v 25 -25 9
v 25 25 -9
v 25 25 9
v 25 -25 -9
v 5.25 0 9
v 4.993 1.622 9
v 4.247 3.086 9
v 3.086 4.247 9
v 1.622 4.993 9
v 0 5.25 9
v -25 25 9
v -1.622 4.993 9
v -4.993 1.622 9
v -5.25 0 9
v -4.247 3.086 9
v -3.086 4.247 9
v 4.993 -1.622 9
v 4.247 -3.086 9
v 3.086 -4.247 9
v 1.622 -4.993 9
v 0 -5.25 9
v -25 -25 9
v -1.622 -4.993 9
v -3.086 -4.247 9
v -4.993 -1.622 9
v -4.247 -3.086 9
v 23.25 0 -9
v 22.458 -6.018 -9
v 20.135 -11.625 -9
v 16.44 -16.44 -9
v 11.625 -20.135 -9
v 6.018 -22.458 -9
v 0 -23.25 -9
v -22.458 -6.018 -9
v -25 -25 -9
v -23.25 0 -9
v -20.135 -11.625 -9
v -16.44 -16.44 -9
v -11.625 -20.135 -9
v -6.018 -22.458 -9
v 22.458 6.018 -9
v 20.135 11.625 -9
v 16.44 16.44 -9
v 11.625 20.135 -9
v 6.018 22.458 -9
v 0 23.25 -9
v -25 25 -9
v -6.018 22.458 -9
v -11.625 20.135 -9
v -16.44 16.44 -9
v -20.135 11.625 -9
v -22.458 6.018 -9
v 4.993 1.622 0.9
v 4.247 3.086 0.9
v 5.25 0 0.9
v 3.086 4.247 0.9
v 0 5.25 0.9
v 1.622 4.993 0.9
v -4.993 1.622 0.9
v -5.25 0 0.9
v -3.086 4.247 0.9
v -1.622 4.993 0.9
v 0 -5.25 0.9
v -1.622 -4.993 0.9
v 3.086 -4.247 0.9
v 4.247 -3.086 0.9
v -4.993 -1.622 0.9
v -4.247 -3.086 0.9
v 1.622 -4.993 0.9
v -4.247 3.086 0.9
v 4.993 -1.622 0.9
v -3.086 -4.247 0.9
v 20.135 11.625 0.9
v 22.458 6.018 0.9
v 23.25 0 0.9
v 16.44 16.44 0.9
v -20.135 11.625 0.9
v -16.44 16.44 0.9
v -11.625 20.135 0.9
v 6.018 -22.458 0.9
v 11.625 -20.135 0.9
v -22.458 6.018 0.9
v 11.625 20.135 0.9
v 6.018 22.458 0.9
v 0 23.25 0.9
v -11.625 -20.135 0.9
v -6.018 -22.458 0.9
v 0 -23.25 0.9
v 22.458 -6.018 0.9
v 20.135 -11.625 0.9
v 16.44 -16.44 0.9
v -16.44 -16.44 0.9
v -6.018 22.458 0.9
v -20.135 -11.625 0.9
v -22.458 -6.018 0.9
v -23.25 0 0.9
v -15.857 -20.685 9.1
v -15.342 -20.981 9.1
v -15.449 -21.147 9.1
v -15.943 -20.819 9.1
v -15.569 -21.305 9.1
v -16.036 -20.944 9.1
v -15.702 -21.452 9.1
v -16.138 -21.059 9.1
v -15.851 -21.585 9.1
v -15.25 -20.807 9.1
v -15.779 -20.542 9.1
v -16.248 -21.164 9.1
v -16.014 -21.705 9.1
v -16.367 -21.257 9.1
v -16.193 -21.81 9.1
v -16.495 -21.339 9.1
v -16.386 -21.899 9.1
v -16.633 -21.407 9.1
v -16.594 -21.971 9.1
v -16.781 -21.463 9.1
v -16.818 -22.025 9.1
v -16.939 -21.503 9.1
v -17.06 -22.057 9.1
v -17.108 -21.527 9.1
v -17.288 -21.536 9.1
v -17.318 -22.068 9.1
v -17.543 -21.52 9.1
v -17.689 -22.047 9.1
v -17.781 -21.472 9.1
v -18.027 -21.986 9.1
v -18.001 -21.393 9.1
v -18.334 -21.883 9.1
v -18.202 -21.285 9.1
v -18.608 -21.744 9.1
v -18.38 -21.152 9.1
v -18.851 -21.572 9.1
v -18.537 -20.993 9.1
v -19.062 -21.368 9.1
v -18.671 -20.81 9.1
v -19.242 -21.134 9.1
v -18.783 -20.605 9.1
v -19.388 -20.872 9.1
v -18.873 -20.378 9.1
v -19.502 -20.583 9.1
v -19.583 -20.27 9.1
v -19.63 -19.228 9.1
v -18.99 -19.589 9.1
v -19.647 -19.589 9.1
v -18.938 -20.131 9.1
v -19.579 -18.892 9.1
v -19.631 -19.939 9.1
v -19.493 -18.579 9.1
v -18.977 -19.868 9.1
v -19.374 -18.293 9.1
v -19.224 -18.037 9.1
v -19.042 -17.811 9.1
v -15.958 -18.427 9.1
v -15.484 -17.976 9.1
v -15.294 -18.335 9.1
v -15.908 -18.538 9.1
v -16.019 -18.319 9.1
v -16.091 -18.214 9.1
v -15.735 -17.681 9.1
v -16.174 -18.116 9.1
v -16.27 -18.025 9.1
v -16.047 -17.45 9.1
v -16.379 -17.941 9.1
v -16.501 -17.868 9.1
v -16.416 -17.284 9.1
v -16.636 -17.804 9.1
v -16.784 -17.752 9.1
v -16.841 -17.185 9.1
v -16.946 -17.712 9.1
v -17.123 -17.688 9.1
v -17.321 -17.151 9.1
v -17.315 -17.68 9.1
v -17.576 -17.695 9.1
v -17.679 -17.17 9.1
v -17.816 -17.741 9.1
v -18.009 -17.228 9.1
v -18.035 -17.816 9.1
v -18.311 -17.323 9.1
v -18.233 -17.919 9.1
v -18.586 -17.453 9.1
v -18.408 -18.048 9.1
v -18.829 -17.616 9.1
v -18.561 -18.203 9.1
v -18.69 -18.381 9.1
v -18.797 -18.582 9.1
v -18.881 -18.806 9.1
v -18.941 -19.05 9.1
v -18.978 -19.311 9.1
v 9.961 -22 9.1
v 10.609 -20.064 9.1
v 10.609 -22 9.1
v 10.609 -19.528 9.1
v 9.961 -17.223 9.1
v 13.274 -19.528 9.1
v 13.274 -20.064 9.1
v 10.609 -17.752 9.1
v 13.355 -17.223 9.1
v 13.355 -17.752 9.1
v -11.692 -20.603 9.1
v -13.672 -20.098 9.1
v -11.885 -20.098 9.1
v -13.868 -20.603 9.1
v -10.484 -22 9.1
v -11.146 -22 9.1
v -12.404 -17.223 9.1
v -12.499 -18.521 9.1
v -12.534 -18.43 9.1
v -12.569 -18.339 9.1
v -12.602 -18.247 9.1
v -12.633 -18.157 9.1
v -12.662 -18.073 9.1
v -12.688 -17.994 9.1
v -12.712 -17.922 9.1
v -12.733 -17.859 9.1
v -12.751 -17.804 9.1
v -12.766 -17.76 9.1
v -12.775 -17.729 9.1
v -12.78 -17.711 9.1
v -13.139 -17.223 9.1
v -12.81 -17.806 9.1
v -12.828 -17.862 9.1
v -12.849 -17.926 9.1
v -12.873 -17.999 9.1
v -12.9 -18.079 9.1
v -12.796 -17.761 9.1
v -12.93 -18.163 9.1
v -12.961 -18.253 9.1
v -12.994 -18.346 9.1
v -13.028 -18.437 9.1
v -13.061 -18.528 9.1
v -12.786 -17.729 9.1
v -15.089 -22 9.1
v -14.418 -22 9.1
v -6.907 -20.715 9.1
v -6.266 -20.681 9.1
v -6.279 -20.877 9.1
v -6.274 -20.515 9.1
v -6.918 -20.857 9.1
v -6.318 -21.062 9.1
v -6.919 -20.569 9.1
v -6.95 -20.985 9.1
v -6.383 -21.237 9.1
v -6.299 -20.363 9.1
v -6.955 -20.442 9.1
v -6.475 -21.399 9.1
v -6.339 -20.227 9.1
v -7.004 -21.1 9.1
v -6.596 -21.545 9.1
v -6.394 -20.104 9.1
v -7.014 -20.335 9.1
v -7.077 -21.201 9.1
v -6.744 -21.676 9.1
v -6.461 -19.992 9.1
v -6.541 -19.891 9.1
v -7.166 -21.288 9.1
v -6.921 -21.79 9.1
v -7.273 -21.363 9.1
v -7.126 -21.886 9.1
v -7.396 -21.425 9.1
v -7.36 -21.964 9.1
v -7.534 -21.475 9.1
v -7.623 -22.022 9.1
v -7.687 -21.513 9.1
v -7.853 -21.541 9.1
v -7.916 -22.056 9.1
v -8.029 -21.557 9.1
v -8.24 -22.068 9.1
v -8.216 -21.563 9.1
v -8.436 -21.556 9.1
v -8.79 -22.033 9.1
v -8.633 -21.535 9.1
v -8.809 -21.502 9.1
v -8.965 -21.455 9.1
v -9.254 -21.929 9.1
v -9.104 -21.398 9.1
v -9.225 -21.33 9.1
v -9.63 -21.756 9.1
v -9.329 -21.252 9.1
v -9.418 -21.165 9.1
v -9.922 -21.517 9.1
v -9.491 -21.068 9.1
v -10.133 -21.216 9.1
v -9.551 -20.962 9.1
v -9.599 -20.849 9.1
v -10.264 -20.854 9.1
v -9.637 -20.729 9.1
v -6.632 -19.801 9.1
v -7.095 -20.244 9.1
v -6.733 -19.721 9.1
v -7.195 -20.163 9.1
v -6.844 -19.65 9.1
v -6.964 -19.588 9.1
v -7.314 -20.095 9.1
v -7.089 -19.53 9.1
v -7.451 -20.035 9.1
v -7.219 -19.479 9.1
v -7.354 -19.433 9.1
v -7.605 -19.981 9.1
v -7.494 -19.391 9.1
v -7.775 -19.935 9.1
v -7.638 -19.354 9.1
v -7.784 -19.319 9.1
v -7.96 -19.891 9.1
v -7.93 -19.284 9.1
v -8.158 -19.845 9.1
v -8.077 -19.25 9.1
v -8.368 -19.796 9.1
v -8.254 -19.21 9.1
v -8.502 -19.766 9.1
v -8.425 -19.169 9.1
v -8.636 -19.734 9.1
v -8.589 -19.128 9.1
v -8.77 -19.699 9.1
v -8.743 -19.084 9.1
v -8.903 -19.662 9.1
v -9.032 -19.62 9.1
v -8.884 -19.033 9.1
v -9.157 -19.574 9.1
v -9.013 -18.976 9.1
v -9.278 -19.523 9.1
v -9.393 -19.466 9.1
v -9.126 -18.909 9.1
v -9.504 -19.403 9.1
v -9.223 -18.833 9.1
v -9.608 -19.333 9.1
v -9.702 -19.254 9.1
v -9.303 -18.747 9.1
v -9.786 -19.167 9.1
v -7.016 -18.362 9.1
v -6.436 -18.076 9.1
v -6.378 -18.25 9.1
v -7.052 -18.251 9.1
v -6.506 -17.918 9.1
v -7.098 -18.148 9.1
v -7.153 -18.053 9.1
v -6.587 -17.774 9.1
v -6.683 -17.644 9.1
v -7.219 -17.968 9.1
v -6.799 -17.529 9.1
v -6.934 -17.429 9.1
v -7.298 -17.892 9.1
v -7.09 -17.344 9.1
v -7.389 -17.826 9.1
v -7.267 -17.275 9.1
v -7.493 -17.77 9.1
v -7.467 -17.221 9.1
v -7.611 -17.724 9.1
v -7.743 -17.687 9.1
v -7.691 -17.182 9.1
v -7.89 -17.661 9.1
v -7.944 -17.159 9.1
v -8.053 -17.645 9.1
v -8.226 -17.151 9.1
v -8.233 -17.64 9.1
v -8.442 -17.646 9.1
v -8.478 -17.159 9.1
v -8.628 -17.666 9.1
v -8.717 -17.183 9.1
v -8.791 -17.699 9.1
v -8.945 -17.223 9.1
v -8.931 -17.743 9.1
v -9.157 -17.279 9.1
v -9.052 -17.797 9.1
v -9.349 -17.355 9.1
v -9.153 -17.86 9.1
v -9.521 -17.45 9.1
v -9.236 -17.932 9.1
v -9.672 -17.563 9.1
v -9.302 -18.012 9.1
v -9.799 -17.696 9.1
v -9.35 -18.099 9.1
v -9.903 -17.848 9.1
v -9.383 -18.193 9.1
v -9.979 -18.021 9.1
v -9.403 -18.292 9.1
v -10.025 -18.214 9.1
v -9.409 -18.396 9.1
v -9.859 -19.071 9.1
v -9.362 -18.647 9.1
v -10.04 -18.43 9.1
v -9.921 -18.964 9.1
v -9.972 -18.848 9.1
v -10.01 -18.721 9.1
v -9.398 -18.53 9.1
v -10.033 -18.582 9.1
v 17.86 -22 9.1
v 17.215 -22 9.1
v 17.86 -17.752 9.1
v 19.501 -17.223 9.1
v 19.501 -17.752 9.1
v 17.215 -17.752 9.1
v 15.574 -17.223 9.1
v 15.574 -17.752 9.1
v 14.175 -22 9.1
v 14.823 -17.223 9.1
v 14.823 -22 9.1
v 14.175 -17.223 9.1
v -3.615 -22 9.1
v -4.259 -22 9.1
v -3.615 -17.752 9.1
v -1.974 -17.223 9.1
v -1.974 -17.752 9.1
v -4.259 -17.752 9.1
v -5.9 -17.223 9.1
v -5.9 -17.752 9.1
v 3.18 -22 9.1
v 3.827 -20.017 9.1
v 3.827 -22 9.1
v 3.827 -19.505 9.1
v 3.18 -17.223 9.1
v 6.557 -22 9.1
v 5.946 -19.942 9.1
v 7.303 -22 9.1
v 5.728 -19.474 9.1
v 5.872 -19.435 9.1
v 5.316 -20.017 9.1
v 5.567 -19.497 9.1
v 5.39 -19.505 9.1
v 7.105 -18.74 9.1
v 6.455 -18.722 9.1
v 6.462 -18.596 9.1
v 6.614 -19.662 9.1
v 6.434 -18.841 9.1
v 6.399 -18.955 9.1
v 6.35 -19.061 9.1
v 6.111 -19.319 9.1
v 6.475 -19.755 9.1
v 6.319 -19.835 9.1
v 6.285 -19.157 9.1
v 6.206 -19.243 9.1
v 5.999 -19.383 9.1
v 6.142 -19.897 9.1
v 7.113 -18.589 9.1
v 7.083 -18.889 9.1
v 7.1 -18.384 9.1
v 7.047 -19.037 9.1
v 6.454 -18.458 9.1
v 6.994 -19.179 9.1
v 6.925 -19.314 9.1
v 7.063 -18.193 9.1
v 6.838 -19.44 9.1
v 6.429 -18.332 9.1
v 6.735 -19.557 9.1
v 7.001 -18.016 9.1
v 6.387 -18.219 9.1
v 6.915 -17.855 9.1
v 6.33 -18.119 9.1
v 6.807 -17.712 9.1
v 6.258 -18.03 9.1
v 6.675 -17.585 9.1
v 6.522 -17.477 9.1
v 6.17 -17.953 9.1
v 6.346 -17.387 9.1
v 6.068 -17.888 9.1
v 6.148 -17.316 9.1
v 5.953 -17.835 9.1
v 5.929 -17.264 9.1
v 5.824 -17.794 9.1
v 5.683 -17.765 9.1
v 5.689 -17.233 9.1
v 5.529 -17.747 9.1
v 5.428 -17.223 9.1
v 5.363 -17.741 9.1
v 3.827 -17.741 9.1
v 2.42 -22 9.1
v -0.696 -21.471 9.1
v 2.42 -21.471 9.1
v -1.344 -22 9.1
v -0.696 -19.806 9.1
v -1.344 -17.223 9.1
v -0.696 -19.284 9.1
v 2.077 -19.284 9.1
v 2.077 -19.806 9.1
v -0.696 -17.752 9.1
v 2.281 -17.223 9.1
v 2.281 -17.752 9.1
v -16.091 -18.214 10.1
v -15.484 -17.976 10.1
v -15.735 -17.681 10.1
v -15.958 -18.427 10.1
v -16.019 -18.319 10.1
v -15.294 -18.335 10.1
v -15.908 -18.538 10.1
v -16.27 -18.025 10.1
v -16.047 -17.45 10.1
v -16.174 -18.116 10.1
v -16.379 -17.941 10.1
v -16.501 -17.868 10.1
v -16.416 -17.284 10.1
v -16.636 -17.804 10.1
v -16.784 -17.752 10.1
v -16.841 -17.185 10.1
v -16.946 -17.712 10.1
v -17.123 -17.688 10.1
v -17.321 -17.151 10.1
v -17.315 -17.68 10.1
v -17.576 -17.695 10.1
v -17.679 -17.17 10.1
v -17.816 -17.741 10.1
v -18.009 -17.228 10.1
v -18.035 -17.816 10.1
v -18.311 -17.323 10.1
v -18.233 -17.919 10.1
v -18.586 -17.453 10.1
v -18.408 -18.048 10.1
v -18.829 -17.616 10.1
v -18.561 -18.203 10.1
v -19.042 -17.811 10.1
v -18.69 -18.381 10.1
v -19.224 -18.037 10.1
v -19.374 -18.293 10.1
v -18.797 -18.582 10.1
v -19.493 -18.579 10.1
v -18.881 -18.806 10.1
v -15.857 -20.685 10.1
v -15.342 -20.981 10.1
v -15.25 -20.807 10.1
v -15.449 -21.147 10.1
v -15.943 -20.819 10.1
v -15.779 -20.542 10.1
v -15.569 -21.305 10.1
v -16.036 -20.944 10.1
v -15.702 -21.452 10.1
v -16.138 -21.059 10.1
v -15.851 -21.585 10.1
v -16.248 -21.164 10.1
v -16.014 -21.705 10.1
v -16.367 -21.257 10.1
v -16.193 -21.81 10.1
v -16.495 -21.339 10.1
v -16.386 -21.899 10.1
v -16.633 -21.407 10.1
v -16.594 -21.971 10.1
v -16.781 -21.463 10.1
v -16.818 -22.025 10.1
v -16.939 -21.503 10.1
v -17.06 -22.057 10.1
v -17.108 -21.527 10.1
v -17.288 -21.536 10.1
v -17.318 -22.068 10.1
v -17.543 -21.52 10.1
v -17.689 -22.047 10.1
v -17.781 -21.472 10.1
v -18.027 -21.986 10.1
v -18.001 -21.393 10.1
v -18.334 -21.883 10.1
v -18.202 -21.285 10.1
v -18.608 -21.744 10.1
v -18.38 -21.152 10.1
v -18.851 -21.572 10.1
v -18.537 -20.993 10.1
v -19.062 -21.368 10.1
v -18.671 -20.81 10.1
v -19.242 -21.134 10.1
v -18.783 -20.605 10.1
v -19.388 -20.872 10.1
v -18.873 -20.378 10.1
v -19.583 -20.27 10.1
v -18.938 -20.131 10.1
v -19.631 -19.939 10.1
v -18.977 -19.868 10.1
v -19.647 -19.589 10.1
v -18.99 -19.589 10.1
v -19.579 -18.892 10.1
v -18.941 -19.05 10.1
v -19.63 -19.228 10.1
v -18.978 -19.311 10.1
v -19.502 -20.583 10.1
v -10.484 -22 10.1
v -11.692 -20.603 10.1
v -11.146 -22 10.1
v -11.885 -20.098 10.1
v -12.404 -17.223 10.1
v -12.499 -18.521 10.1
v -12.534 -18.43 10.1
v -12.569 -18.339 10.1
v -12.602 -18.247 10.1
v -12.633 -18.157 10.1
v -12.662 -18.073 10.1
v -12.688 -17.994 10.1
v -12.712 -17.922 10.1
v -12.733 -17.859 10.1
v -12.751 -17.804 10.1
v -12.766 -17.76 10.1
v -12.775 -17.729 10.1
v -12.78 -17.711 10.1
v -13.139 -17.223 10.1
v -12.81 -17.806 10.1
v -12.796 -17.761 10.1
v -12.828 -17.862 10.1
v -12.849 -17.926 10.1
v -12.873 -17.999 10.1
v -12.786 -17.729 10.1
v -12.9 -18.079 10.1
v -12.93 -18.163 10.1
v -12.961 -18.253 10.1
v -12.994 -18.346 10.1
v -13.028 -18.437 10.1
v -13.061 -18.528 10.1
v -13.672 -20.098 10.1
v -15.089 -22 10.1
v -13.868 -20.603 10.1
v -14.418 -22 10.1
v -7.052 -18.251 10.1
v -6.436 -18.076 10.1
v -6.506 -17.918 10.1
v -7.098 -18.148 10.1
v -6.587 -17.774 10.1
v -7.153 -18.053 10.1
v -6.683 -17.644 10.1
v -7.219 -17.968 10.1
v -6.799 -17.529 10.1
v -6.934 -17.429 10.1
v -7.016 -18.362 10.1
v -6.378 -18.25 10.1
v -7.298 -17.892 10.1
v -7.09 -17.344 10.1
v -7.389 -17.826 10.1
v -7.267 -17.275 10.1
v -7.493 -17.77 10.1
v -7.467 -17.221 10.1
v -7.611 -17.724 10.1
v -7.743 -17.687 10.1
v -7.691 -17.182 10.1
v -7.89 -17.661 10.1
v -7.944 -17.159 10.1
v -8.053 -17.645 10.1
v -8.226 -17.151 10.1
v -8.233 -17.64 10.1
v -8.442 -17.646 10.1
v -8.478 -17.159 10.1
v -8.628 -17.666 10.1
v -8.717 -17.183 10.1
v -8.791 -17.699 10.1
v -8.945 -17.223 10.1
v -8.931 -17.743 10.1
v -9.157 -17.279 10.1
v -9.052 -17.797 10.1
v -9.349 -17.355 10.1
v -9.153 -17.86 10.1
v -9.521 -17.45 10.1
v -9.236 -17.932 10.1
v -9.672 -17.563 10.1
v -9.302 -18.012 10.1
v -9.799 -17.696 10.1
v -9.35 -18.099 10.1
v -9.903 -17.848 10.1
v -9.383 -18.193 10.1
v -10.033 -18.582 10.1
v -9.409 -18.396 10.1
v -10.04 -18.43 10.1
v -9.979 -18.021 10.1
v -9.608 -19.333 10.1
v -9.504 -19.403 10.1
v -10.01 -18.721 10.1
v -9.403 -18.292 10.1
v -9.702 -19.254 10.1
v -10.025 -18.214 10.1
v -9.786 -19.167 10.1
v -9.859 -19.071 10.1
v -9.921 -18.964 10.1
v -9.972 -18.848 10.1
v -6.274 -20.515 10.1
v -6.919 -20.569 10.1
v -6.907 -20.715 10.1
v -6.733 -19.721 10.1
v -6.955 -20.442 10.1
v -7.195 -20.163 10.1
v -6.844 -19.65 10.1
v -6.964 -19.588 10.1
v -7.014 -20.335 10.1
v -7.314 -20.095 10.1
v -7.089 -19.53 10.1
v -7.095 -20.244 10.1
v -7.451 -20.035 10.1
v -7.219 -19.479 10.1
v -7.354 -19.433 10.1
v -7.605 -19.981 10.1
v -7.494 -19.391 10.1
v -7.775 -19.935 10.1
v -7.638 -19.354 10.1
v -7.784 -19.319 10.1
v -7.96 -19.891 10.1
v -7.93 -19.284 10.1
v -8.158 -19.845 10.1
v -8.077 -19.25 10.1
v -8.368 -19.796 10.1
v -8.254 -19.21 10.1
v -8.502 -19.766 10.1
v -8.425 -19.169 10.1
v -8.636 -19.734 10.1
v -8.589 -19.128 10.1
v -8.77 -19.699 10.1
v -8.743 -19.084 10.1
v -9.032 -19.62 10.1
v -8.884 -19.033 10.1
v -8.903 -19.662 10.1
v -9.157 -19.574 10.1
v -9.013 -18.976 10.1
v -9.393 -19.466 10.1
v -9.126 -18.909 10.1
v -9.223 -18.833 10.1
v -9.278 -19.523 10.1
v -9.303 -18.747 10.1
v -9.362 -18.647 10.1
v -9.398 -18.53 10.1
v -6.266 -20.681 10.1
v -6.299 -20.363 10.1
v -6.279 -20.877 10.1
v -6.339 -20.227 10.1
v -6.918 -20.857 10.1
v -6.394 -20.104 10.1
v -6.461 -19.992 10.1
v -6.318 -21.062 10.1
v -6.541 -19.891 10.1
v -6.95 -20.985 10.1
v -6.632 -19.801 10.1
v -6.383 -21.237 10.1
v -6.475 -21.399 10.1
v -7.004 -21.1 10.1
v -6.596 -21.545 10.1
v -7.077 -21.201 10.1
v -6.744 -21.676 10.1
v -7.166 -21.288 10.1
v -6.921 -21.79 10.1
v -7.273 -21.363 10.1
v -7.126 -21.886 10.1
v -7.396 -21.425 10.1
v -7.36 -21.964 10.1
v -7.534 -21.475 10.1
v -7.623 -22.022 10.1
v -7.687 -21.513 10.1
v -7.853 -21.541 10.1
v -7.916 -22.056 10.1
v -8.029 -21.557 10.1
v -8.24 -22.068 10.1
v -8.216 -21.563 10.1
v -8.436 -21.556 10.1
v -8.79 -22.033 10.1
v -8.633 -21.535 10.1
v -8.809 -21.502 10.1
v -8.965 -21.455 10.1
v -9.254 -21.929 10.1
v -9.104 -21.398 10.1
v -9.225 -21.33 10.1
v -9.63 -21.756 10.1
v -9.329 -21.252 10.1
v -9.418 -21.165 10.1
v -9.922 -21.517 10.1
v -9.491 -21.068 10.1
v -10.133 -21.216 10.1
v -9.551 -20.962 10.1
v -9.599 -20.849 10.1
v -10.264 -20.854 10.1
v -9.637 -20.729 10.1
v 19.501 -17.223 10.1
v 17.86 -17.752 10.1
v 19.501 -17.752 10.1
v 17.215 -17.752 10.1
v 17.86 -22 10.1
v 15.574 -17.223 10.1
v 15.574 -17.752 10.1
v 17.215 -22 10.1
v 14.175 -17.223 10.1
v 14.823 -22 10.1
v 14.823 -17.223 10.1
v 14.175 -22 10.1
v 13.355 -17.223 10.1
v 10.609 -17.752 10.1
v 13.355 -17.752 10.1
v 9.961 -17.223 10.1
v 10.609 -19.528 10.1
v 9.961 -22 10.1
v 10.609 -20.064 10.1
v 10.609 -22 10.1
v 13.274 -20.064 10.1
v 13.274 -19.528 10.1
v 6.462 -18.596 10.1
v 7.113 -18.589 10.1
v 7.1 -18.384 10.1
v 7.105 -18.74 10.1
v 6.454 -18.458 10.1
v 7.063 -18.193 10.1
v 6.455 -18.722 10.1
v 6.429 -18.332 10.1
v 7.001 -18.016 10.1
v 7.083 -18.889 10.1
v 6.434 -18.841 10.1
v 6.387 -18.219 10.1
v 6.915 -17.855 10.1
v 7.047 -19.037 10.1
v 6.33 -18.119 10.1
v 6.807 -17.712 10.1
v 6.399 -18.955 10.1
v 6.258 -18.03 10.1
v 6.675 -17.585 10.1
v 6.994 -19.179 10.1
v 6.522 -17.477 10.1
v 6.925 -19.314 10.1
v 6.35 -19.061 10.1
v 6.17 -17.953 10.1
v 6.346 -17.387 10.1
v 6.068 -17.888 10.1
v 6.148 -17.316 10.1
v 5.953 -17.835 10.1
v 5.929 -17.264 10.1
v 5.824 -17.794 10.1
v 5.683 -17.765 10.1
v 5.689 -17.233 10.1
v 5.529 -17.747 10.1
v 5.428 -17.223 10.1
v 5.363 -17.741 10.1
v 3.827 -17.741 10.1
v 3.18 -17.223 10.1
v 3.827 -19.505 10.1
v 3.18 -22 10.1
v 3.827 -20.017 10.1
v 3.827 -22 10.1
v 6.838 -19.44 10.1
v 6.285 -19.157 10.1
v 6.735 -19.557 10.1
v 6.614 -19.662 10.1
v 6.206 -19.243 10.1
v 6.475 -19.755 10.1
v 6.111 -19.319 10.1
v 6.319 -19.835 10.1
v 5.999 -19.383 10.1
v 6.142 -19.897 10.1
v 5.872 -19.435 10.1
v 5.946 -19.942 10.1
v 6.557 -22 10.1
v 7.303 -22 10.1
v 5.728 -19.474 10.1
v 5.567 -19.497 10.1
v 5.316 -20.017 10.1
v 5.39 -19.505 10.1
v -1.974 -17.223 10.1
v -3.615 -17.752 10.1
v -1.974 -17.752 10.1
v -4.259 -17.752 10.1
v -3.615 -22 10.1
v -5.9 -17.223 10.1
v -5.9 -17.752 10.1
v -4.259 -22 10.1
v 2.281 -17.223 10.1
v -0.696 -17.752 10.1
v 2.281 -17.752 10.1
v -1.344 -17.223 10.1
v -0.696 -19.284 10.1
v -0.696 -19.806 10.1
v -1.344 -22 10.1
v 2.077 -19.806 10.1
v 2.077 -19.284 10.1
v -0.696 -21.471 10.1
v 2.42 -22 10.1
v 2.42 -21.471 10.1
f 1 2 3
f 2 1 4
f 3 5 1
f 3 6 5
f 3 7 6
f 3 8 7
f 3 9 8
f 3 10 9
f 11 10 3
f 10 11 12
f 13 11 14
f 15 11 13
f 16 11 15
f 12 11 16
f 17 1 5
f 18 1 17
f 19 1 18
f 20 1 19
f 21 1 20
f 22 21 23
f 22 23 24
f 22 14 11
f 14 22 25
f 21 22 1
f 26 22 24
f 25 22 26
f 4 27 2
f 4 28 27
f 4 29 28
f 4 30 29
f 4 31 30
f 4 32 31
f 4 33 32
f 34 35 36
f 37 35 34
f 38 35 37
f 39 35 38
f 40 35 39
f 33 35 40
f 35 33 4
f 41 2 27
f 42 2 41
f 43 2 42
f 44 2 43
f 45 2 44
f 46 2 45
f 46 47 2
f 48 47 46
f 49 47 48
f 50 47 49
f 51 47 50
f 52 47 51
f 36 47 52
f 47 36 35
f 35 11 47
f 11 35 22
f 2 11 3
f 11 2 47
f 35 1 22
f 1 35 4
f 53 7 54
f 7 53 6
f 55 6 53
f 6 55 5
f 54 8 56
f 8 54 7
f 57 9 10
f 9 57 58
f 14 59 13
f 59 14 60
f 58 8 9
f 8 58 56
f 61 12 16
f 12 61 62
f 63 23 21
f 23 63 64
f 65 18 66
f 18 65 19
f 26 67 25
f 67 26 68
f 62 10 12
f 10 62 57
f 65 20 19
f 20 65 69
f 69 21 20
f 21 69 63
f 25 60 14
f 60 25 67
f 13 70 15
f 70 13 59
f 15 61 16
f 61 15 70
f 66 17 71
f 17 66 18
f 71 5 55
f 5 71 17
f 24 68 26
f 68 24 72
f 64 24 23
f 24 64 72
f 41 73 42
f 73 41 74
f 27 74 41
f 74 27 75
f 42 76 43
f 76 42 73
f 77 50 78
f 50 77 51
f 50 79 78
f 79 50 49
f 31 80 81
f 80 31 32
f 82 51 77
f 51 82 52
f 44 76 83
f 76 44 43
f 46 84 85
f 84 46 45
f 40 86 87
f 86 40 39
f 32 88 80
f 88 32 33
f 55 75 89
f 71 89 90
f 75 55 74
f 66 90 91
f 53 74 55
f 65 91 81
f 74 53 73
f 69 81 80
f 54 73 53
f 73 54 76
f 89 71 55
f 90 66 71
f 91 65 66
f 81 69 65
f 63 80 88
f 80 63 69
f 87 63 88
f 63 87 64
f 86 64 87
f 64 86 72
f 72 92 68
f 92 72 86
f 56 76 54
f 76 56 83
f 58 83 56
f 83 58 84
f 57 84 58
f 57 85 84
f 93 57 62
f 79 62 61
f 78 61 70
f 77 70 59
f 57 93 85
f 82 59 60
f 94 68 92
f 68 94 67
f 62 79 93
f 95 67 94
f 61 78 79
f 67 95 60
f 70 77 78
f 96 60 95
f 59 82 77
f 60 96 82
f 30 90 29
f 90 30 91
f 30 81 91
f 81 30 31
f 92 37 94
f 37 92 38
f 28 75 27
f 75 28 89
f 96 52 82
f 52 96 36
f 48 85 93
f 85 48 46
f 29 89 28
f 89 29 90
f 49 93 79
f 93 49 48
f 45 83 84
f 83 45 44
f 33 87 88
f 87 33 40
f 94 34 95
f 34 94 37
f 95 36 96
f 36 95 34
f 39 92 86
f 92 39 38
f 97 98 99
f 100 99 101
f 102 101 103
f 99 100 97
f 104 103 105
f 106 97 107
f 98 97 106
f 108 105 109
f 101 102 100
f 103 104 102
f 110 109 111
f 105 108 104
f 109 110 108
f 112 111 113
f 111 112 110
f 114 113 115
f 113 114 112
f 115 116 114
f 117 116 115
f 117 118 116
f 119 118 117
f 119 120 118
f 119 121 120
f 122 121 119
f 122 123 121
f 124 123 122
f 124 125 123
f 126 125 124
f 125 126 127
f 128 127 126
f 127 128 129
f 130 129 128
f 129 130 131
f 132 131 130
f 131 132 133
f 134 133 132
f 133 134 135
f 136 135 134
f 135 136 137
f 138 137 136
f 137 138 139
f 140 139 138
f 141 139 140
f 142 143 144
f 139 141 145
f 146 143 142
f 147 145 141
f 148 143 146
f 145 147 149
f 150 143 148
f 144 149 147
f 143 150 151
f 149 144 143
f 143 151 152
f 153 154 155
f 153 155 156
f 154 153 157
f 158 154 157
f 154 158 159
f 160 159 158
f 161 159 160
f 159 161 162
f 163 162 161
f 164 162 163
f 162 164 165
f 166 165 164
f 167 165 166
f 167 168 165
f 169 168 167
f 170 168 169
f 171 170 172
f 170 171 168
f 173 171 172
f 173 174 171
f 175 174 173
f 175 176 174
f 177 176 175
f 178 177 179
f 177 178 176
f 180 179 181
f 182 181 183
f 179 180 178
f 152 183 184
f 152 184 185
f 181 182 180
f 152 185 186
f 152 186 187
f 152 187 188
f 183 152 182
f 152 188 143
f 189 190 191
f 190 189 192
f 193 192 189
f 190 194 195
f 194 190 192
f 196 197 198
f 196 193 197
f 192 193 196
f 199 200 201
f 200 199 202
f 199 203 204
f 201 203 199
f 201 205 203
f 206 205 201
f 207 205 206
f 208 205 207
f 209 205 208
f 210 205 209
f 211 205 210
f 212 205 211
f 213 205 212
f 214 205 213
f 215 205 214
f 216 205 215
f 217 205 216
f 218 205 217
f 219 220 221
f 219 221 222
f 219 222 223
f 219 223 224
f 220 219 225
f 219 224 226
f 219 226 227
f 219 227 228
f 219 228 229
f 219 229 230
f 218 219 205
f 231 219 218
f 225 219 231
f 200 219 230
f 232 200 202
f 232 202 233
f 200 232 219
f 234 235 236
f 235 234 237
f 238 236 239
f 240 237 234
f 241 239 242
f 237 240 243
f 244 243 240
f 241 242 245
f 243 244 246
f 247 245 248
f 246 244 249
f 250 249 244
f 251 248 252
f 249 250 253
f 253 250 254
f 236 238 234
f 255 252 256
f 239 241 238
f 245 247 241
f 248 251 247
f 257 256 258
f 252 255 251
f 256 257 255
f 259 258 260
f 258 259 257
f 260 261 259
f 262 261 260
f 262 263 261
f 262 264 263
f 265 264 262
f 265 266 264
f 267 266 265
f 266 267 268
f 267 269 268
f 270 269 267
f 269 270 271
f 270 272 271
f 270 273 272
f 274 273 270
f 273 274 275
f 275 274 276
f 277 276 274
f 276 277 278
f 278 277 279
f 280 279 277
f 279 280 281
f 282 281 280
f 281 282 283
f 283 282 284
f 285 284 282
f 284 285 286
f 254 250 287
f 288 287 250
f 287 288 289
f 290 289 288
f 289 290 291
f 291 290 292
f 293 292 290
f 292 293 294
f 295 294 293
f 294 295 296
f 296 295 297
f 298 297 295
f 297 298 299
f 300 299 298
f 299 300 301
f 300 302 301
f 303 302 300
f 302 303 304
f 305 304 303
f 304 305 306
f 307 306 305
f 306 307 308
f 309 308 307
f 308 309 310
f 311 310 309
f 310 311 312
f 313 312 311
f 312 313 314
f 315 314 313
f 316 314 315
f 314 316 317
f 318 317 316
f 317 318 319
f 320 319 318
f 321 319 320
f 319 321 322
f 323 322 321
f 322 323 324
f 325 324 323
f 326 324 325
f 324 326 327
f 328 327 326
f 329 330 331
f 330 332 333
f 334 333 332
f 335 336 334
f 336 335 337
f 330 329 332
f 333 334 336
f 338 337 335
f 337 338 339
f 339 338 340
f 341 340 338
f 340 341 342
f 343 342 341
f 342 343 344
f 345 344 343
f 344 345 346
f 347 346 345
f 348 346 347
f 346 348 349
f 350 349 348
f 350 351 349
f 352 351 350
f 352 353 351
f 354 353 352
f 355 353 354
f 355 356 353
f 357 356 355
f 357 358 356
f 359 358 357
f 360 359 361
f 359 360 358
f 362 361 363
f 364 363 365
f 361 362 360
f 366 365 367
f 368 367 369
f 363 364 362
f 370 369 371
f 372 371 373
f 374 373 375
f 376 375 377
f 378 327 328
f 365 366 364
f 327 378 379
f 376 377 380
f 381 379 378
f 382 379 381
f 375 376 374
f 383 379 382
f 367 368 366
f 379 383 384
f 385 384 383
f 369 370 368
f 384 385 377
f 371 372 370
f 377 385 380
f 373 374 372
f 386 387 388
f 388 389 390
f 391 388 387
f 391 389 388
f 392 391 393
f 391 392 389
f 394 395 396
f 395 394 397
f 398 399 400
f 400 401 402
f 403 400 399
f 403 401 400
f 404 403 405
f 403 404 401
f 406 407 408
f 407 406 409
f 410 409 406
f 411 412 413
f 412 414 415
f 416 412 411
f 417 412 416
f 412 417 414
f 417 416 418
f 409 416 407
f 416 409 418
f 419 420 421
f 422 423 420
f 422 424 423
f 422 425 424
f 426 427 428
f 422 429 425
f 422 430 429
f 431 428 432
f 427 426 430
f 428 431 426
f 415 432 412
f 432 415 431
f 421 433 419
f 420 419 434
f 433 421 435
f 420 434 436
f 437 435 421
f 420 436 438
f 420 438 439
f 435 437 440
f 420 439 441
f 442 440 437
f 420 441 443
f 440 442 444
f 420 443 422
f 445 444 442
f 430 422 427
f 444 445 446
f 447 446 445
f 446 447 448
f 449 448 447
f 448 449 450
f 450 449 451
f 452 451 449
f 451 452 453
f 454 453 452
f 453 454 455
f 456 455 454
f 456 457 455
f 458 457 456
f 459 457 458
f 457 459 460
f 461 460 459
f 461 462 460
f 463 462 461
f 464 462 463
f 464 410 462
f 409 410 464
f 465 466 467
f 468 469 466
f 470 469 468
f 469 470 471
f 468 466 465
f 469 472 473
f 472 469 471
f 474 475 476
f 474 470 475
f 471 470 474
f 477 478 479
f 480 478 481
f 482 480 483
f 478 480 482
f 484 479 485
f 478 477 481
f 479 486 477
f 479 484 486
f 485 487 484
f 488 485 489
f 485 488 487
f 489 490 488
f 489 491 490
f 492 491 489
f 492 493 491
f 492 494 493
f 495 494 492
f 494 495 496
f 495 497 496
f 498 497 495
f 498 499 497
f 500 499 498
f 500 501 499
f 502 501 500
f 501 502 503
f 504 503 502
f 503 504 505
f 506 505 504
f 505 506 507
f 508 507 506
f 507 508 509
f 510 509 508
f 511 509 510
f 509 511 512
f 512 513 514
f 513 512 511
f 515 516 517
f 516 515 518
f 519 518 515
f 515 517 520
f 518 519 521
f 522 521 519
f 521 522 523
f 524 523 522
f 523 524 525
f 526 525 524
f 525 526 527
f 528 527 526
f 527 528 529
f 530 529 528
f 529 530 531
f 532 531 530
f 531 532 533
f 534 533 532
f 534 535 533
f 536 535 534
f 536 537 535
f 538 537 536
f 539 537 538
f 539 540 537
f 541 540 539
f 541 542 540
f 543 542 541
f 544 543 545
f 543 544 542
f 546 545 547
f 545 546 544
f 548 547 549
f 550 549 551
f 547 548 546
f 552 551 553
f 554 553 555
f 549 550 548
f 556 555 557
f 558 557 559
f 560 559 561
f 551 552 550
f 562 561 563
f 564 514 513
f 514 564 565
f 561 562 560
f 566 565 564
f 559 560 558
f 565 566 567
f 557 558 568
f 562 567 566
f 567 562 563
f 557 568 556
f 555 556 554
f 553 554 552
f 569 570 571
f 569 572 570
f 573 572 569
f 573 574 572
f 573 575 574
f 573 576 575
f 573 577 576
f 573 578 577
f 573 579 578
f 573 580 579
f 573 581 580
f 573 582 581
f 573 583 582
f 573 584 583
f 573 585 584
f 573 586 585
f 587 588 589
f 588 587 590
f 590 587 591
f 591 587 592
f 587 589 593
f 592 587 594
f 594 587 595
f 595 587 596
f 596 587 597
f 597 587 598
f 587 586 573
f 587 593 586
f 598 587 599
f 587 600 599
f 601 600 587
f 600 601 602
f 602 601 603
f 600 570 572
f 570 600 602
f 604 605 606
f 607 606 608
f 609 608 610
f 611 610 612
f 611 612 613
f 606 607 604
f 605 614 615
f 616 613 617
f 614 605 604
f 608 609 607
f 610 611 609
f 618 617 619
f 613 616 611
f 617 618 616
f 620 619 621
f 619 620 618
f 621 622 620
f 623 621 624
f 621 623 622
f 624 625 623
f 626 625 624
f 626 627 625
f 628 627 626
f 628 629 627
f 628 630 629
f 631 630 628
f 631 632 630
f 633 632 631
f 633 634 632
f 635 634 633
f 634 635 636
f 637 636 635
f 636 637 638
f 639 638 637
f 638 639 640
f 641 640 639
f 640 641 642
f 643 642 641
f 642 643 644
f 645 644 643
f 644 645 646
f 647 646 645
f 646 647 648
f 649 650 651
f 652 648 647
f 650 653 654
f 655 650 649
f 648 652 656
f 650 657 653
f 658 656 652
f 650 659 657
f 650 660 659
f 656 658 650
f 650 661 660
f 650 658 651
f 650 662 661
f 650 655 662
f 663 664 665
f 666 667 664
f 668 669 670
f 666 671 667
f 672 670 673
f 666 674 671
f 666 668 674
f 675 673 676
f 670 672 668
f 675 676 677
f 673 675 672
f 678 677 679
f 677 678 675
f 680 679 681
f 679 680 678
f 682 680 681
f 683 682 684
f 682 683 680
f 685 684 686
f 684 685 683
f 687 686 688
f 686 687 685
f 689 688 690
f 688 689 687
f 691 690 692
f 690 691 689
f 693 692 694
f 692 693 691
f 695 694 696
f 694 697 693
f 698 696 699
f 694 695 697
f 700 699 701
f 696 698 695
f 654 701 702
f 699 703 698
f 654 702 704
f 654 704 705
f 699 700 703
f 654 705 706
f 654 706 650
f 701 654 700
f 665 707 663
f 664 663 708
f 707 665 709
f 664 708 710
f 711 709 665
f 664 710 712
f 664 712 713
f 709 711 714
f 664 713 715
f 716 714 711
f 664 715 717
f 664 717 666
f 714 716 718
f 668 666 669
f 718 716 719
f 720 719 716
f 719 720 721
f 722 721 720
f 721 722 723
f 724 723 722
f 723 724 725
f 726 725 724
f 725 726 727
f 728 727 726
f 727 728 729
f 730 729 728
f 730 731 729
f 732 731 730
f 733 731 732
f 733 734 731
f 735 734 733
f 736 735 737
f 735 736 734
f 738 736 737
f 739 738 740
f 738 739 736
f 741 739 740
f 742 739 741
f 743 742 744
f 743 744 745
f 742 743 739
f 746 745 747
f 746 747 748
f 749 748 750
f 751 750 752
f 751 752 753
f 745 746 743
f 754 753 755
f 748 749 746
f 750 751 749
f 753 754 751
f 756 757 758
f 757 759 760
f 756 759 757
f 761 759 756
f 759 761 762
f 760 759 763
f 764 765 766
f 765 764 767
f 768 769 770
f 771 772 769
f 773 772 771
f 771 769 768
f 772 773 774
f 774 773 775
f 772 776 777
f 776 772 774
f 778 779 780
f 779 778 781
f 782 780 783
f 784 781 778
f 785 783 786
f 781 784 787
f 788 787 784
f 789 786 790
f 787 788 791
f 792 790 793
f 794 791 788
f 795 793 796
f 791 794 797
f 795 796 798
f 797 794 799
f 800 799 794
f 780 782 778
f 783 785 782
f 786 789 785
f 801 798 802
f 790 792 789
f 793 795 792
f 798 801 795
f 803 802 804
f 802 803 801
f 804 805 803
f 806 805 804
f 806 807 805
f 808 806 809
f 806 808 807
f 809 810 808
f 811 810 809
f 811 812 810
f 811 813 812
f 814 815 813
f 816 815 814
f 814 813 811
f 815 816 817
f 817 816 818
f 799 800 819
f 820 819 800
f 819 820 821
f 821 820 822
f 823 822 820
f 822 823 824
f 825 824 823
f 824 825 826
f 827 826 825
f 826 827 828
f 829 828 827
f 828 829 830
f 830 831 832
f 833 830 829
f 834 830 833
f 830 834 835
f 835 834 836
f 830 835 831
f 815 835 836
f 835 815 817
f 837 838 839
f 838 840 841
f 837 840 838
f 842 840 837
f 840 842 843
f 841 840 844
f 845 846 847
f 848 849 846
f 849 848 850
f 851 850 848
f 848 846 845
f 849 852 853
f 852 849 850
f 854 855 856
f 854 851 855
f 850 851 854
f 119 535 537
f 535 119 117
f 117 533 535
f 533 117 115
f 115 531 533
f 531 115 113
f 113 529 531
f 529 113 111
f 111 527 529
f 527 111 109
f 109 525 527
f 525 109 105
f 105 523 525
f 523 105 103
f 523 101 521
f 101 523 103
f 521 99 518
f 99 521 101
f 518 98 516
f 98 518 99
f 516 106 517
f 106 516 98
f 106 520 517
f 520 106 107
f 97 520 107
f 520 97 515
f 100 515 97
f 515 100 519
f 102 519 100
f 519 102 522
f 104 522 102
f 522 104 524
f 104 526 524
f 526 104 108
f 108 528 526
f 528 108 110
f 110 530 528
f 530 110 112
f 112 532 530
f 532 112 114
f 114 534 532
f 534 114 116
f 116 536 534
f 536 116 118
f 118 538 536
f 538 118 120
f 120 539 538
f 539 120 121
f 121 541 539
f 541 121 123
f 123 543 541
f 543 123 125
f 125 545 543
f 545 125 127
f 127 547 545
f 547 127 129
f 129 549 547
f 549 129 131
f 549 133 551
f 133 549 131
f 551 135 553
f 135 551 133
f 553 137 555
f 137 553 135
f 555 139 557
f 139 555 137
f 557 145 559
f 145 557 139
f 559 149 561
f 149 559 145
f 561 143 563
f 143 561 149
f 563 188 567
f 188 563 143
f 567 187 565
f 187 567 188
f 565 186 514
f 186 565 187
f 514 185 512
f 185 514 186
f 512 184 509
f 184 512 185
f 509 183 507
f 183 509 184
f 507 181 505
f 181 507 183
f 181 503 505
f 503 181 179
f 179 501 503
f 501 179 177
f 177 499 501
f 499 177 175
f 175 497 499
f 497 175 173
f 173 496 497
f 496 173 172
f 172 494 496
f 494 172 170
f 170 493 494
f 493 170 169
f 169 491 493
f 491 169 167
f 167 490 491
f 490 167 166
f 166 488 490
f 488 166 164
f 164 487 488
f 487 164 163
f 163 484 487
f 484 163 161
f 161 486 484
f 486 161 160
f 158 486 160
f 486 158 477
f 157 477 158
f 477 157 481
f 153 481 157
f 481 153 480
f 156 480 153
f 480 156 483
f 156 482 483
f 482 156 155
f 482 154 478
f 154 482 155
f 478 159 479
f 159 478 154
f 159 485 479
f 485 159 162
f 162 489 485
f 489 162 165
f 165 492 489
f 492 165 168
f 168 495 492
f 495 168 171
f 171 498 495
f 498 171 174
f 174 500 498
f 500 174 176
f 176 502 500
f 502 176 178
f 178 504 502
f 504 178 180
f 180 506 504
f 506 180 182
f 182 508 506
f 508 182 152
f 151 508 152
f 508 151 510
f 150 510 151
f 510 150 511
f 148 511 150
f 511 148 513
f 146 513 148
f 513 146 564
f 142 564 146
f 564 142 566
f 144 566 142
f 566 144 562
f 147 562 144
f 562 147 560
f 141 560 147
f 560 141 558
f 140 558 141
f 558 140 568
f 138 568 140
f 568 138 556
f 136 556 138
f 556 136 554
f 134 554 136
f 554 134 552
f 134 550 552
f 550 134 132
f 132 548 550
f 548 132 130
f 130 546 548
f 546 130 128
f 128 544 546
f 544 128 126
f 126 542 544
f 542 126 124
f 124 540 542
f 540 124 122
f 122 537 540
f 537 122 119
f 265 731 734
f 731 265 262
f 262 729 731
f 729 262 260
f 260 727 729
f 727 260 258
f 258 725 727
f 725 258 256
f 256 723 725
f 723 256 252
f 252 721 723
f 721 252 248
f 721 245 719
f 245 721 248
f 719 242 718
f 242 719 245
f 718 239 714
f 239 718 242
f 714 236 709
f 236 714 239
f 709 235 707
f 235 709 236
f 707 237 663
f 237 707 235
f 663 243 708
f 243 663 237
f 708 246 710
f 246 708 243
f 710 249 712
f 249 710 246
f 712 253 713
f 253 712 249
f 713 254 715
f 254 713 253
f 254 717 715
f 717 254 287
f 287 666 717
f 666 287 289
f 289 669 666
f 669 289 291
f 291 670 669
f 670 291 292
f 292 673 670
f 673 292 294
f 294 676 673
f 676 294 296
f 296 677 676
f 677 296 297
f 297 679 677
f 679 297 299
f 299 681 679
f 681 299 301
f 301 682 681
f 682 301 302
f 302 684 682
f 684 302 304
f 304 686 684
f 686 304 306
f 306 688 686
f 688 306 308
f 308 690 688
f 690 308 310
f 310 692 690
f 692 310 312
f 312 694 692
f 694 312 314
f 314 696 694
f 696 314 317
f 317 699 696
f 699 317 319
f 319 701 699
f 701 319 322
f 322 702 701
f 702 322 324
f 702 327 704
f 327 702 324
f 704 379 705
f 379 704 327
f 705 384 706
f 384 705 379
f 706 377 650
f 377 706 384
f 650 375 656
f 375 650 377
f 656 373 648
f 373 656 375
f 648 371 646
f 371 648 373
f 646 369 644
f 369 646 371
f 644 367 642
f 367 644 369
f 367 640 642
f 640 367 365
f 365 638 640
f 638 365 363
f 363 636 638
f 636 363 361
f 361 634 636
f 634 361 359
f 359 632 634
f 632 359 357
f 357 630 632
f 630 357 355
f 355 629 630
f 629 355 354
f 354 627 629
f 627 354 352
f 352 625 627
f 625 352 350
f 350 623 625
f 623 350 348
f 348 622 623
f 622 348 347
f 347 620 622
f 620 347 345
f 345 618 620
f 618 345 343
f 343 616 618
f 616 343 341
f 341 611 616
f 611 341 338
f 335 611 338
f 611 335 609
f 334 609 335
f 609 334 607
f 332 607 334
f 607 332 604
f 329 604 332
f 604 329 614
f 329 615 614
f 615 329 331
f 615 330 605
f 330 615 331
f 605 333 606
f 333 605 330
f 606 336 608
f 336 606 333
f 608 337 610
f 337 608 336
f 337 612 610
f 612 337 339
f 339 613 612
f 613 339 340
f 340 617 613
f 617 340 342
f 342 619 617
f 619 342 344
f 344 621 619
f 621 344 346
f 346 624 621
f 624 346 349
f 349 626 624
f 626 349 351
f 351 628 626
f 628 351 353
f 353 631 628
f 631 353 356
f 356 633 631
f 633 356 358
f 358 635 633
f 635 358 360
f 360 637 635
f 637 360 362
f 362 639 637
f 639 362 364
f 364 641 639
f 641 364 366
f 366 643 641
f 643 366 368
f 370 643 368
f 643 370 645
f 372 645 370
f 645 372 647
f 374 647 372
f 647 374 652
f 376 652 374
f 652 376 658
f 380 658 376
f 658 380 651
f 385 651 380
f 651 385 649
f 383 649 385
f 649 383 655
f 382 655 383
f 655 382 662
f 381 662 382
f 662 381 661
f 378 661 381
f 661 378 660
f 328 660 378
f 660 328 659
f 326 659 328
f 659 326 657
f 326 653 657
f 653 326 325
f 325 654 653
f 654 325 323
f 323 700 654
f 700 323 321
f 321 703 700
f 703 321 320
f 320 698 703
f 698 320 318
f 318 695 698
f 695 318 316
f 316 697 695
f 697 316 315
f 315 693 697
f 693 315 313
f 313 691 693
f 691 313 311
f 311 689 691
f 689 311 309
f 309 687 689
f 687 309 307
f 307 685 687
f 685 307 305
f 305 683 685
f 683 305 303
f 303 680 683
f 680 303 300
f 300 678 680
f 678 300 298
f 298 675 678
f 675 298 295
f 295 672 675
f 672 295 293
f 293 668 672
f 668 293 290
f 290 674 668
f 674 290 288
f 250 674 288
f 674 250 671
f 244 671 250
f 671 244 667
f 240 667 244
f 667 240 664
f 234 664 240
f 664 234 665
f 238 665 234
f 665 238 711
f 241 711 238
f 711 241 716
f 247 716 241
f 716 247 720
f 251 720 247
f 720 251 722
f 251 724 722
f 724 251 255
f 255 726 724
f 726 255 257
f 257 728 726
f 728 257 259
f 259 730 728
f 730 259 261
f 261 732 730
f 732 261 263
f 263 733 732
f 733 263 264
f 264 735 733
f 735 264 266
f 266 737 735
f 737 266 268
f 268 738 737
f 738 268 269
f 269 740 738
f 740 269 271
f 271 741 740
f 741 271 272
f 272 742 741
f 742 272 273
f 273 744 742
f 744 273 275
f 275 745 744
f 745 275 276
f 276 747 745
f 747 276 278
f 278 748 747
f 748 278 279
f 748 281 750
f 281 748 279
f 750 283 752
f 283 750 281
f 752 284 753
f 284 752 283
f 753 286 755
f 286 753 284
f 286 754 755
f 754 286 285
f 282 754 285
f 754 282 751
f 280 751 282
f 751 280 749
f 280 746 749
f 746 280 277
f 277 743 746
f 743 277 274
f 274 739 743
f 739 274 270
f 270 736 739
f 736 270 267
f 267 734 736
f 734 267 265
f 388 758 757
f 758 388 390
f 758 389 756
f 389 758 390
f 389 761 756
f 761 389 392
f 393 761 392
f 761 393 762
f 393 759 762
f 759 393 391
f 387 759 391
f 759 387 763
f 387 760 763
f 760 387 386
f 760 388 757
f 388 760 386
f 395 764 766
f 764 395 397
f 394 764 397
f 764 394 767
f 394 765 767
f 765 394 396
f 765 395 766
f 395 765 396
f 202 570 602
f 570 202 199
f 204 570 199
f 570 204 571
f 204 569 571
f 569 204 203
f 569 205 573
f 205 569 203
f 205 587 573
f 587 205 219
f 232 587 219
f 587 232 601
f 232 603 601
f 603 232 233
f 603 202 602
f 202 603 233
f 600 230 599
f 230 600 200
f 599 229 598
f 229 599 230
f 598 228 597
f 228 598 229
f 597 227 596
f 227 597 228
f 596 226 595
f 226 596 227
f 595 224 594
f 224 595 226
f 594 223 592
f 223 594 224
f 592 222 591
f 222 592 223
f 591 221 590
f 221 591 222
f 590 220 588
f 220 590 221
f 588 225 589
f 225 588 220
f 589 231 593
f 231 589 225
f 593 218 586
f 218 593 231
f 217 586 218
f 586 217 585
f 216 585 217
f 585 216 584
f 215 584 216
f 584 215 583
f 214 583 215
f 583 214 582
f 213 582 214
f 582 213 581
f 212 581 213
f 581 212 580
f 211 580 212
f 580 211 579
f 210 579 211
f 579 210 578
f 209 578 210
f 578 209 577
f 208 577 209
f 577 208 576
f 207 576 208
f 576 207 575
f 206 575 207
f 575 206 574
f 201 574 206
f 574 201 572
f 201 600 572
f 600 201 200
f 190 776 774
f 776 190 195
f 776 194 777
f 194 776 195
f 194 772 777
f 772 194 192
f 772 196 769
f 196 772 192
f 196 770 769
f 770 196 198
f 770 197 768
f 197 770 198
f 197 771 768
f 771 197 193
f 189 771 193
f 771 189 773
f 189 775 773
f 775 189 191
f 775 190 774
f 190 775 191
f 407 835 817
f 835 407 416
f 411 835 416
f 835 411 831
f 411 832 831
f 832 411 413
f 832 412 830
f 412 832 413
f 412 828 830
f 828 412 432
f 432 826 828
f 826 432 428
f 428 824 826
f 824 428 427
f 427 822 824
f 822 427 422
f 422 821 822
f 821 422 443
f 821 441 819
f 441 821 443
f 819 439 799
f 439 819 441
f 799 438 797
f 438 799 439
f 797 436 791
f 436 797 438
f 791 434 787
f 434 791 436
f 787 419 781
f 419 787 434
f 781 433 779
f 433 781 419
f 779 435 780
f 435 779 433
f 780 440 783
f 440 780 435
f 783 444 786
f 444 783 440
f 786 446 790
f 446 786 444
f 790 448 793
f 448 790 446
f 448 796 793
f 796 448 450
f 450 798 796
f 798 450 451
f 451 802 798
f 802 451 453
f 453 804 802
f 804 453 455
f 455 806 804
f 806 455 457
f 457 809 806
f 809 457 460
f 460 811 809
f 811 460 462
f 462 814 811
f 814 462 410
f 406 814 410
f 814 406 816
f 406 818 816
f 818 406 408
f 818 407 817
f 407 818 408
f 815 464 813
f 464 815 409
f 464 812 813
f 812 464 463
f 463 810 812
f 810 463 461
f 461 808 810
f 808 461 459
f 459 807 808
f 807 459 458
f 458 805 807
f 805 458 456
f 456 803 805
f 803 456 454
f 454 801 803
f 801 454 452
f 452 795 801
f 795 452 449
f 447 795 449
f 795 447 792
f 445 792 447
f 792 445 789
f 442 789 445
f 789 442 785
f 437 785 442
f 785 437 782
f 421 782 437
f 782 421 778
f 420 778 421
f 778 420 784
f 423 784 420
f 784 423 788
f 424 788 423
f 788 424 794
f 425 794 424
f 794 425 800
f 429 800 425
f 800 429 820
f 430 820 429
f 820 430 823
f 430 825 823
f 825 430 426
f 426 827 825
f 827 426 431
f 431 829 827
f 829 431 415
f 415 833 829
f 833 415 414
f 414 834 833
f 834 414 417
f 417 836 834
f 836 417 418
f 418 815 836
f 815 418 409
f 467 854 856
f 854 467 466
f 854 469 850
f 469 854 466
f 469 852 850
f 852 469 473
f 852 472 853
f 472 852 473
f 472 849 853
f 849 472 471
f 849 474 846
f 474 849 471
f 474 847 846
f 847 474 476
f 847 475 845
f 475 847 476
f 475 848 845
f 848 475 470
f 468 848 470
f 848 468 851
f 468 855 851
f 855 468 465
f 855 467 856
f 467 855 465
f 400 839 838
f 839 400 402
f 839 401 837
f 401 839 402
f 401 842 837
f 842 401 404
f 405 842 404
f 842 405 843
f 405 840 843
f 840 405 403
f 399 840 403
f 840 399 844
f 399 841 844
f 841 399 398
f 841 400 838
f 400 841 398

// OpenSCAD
// file: ../roborock-s5-caster/caster.scad
// Roborock S5-family Caster Wheel Assembly (HA00021 / omnidirectional)
// =====================================================================
//
// Parametric 3D model of the front omnidirectional caster (HA00021) used in
// Roborock S4, S5, S5 Max, S5 Max+, S6, S6 Pure, S6 MaxV, S7, E4, and others.
//
// STATUS: DRAFT — dimensions marked "(estimate)" have NOT been verified
// against a physical part. See MEASURE-ME.md for the caliper checklist.
//
// NOTE: The oomwoo-one-cad library already has `irobot_caster.step` for the
// Roomba i7/i3/j7-family caster. This model is for the *Roborock S5-family*
// caster (HA00021), which has different dimensions and mounting.
//
// References:
//   - OsakaTX part-specs: io-board-wheel-connector-and-caster.md (HA00021, ~46×52mm)
//   - iFixit guide: snap-in, no tools required
//   - Amazon WYZBEN listing: "Approx. 1.8'' (46mm) × 2'' (52mm)"

// ===================== PARAMETERS =====================

// --- Overall ---
overall_diameter    = 46;    // ~46mm per Amazon WYZBEN listing / OsakaTX spec — caliper verify
overall_height      = 52;    // ~52mm (includes snap-in stem) — caliper verify

// --- Wheel / roller ---
roller_diameter     = 18;    // (estimate) diameter of the omnidirectional roller/ball
roller_width        = 26;    // (estimate) visible roller width from side
roller_axle_dia     = 3;     // (estimate) roller axle pin diameter

// --- Housing ---
housing_bottom_dia  = 38;    // (estimate) diameter of the caster housing body at bottom
housing_top_dia     = 28;    // (estimate) diameter at top (tapered)
housing_height      = 28;    // (estimate) housing body height (excludes snap stem)

// --- Snap-in stem / mounting ---
stem_diameter       = 10;    // (estimate) snap-in stem diameter
stem_length         = 12;    // (estimate) stem length from housing top to retention ring
stem_retain_dia     = 14;    // (estimate) retention ring/fins diameter
stem_retain_z       = 6;     // (estimate) retention ring z-offset from housing top

// --- Rotation ---
swivel_clearance    = 1.5;   // (estimate) gap between housing and chassis floor

// ===================== MODULES =====================

module roller_assembly() {
    // The omnidirectional roller that makes floor contact
    color("#555555")
    rotate([0, 90, 0])
    union() {
        // Main roller body (slightly barrel-shaped for omni-directional)
        rotate_extrude($fn=24)
        translate([roller_diameter/2, 0, 0])
        scale([1, 1.2])
        circle(d=roller_width * 0.6, $fn=20);
        
        // Axle pin
        cylinder(d=roller_axle_dia, h=roller_width + 4, center=true, $fn=8);
    }
}

module housing() {
    // The plastic housing that holds the roller and snap-in stem
    color("#3a3a3a")
    union() {
        // Main tapered housing
        cylinder(h=housing_height, d1=housing_bottom_dia, d2=housing_top_dia, $fn=32);
        
        // Snap-in stem (extends above the housing)
        translate([0, 0, housing_height])
        cylinder(h=stem_length, d=stem_diameter, $fn=20);
        
        // Retention ring/barbs
        translate([0, 0, housing_height + stem_retain_z])
        cylinder(h=1.5, d=stem_retain_dia, $fn=20);
        
        // Second retention ring/barbs
        translate([0, 0, housing_height + stem_length - 2])
        cylinder(h=1.5, d=stem_retain_dia, $fn=20);
        
        // Side support ribs (4x)
        for (a = [0:90:270]) {
            rotate([0, 0, a])
            translate([housing_bottom_dia/2 - 2, -1.5, housing_height * 0.6])
            cube([4, 3, housing_height * 0.4]);
        }
    }
}

module roller_cavity() {
    // Cutout in housing for the roller — subtract from housing
    rotate([0, 0, 0])
    translate([0, 0, 6])
    rotate([90, 0, 0])
    cylinder(d=roller_diameter + 4, h=housing_bottom_dia, center=true, $fn=32);
}

module complete_caster() {
    // Housing with roller cavity
    difference() {
        housing();
        roller_cavity();
    }
    
    // Roller mounted in housing
    translate([0, 0, 11])
    rotate([90, 0, 0])
    roller_assembly();
}

module caster_envelope() {
    // Simplified bounding cylinder for chassis layout
    color("Gray", 0.2)
    cylinder(d=overall_diameter, h=overall_height, $fn=24);
}

// ===================== RENDER =====================

// Uncomment to render:
// complete_caster();
// caster_envelope();
// main file
// Jig: Caster Snap-Fit Pocket
// ==============================
//
// Print this block and snap in the Roborock S5 caster wheel (HA00021).
// Verifies stem diameter, retention ring engagement, and swivel clearance.
//
// References parameters from ../roborock-s5-caster/caster.scad

include <../roborock-s5-caster/caster.scad>;

// Block dimensions
block_w = 50;
block_d = 50;
block_h = 18;

// Pocket parameters (derived from caster stem)
pocket_dia = stem_diameter + 0.5;  // 0.5mm clearance
pocket_depth = overall_height - housing_height;  // portion that embeds
retain_pocket_dia = stem_retain_dia + 1.0;  // 1mm clearance for retention barbs
retain_z_offset = stem_retain_z + 0.5;

module caster_pocket_jig() {
    difference() {
        // Block
        color("Green", 0.5)
        cube([block_w, block_d, block_h], center=true);
        
        // Stem pocket
        translate([0, 0, block_h/2 - pocket_depth + 1])
        cylinder(d=pocket_dia, h=pocket_depth + 1, $fn=20);
        
        // Retention ring pocket (slightly wider)
        translate([0, 0, block_h/2 - (pocket_depth - retain_z_offset) - 1])
        cylinder(d=retain_pocket_dia, h=3, $fn=20);
        
        // Swivel clearance — wider pocket bottom
        translate([0, 0, -block_h/2 - 0.1])
        cylinder(d=overall_diameter + 0.5, h=block_h/2 + 1, $fn=24);
    }
    
    // Label
    color("White")
    translate([-20, -22, block_h/2 + 0.1])
    linear_extrude(1)
    text("CASTER FIT", size=5);
}

caster_pocket_jig();
